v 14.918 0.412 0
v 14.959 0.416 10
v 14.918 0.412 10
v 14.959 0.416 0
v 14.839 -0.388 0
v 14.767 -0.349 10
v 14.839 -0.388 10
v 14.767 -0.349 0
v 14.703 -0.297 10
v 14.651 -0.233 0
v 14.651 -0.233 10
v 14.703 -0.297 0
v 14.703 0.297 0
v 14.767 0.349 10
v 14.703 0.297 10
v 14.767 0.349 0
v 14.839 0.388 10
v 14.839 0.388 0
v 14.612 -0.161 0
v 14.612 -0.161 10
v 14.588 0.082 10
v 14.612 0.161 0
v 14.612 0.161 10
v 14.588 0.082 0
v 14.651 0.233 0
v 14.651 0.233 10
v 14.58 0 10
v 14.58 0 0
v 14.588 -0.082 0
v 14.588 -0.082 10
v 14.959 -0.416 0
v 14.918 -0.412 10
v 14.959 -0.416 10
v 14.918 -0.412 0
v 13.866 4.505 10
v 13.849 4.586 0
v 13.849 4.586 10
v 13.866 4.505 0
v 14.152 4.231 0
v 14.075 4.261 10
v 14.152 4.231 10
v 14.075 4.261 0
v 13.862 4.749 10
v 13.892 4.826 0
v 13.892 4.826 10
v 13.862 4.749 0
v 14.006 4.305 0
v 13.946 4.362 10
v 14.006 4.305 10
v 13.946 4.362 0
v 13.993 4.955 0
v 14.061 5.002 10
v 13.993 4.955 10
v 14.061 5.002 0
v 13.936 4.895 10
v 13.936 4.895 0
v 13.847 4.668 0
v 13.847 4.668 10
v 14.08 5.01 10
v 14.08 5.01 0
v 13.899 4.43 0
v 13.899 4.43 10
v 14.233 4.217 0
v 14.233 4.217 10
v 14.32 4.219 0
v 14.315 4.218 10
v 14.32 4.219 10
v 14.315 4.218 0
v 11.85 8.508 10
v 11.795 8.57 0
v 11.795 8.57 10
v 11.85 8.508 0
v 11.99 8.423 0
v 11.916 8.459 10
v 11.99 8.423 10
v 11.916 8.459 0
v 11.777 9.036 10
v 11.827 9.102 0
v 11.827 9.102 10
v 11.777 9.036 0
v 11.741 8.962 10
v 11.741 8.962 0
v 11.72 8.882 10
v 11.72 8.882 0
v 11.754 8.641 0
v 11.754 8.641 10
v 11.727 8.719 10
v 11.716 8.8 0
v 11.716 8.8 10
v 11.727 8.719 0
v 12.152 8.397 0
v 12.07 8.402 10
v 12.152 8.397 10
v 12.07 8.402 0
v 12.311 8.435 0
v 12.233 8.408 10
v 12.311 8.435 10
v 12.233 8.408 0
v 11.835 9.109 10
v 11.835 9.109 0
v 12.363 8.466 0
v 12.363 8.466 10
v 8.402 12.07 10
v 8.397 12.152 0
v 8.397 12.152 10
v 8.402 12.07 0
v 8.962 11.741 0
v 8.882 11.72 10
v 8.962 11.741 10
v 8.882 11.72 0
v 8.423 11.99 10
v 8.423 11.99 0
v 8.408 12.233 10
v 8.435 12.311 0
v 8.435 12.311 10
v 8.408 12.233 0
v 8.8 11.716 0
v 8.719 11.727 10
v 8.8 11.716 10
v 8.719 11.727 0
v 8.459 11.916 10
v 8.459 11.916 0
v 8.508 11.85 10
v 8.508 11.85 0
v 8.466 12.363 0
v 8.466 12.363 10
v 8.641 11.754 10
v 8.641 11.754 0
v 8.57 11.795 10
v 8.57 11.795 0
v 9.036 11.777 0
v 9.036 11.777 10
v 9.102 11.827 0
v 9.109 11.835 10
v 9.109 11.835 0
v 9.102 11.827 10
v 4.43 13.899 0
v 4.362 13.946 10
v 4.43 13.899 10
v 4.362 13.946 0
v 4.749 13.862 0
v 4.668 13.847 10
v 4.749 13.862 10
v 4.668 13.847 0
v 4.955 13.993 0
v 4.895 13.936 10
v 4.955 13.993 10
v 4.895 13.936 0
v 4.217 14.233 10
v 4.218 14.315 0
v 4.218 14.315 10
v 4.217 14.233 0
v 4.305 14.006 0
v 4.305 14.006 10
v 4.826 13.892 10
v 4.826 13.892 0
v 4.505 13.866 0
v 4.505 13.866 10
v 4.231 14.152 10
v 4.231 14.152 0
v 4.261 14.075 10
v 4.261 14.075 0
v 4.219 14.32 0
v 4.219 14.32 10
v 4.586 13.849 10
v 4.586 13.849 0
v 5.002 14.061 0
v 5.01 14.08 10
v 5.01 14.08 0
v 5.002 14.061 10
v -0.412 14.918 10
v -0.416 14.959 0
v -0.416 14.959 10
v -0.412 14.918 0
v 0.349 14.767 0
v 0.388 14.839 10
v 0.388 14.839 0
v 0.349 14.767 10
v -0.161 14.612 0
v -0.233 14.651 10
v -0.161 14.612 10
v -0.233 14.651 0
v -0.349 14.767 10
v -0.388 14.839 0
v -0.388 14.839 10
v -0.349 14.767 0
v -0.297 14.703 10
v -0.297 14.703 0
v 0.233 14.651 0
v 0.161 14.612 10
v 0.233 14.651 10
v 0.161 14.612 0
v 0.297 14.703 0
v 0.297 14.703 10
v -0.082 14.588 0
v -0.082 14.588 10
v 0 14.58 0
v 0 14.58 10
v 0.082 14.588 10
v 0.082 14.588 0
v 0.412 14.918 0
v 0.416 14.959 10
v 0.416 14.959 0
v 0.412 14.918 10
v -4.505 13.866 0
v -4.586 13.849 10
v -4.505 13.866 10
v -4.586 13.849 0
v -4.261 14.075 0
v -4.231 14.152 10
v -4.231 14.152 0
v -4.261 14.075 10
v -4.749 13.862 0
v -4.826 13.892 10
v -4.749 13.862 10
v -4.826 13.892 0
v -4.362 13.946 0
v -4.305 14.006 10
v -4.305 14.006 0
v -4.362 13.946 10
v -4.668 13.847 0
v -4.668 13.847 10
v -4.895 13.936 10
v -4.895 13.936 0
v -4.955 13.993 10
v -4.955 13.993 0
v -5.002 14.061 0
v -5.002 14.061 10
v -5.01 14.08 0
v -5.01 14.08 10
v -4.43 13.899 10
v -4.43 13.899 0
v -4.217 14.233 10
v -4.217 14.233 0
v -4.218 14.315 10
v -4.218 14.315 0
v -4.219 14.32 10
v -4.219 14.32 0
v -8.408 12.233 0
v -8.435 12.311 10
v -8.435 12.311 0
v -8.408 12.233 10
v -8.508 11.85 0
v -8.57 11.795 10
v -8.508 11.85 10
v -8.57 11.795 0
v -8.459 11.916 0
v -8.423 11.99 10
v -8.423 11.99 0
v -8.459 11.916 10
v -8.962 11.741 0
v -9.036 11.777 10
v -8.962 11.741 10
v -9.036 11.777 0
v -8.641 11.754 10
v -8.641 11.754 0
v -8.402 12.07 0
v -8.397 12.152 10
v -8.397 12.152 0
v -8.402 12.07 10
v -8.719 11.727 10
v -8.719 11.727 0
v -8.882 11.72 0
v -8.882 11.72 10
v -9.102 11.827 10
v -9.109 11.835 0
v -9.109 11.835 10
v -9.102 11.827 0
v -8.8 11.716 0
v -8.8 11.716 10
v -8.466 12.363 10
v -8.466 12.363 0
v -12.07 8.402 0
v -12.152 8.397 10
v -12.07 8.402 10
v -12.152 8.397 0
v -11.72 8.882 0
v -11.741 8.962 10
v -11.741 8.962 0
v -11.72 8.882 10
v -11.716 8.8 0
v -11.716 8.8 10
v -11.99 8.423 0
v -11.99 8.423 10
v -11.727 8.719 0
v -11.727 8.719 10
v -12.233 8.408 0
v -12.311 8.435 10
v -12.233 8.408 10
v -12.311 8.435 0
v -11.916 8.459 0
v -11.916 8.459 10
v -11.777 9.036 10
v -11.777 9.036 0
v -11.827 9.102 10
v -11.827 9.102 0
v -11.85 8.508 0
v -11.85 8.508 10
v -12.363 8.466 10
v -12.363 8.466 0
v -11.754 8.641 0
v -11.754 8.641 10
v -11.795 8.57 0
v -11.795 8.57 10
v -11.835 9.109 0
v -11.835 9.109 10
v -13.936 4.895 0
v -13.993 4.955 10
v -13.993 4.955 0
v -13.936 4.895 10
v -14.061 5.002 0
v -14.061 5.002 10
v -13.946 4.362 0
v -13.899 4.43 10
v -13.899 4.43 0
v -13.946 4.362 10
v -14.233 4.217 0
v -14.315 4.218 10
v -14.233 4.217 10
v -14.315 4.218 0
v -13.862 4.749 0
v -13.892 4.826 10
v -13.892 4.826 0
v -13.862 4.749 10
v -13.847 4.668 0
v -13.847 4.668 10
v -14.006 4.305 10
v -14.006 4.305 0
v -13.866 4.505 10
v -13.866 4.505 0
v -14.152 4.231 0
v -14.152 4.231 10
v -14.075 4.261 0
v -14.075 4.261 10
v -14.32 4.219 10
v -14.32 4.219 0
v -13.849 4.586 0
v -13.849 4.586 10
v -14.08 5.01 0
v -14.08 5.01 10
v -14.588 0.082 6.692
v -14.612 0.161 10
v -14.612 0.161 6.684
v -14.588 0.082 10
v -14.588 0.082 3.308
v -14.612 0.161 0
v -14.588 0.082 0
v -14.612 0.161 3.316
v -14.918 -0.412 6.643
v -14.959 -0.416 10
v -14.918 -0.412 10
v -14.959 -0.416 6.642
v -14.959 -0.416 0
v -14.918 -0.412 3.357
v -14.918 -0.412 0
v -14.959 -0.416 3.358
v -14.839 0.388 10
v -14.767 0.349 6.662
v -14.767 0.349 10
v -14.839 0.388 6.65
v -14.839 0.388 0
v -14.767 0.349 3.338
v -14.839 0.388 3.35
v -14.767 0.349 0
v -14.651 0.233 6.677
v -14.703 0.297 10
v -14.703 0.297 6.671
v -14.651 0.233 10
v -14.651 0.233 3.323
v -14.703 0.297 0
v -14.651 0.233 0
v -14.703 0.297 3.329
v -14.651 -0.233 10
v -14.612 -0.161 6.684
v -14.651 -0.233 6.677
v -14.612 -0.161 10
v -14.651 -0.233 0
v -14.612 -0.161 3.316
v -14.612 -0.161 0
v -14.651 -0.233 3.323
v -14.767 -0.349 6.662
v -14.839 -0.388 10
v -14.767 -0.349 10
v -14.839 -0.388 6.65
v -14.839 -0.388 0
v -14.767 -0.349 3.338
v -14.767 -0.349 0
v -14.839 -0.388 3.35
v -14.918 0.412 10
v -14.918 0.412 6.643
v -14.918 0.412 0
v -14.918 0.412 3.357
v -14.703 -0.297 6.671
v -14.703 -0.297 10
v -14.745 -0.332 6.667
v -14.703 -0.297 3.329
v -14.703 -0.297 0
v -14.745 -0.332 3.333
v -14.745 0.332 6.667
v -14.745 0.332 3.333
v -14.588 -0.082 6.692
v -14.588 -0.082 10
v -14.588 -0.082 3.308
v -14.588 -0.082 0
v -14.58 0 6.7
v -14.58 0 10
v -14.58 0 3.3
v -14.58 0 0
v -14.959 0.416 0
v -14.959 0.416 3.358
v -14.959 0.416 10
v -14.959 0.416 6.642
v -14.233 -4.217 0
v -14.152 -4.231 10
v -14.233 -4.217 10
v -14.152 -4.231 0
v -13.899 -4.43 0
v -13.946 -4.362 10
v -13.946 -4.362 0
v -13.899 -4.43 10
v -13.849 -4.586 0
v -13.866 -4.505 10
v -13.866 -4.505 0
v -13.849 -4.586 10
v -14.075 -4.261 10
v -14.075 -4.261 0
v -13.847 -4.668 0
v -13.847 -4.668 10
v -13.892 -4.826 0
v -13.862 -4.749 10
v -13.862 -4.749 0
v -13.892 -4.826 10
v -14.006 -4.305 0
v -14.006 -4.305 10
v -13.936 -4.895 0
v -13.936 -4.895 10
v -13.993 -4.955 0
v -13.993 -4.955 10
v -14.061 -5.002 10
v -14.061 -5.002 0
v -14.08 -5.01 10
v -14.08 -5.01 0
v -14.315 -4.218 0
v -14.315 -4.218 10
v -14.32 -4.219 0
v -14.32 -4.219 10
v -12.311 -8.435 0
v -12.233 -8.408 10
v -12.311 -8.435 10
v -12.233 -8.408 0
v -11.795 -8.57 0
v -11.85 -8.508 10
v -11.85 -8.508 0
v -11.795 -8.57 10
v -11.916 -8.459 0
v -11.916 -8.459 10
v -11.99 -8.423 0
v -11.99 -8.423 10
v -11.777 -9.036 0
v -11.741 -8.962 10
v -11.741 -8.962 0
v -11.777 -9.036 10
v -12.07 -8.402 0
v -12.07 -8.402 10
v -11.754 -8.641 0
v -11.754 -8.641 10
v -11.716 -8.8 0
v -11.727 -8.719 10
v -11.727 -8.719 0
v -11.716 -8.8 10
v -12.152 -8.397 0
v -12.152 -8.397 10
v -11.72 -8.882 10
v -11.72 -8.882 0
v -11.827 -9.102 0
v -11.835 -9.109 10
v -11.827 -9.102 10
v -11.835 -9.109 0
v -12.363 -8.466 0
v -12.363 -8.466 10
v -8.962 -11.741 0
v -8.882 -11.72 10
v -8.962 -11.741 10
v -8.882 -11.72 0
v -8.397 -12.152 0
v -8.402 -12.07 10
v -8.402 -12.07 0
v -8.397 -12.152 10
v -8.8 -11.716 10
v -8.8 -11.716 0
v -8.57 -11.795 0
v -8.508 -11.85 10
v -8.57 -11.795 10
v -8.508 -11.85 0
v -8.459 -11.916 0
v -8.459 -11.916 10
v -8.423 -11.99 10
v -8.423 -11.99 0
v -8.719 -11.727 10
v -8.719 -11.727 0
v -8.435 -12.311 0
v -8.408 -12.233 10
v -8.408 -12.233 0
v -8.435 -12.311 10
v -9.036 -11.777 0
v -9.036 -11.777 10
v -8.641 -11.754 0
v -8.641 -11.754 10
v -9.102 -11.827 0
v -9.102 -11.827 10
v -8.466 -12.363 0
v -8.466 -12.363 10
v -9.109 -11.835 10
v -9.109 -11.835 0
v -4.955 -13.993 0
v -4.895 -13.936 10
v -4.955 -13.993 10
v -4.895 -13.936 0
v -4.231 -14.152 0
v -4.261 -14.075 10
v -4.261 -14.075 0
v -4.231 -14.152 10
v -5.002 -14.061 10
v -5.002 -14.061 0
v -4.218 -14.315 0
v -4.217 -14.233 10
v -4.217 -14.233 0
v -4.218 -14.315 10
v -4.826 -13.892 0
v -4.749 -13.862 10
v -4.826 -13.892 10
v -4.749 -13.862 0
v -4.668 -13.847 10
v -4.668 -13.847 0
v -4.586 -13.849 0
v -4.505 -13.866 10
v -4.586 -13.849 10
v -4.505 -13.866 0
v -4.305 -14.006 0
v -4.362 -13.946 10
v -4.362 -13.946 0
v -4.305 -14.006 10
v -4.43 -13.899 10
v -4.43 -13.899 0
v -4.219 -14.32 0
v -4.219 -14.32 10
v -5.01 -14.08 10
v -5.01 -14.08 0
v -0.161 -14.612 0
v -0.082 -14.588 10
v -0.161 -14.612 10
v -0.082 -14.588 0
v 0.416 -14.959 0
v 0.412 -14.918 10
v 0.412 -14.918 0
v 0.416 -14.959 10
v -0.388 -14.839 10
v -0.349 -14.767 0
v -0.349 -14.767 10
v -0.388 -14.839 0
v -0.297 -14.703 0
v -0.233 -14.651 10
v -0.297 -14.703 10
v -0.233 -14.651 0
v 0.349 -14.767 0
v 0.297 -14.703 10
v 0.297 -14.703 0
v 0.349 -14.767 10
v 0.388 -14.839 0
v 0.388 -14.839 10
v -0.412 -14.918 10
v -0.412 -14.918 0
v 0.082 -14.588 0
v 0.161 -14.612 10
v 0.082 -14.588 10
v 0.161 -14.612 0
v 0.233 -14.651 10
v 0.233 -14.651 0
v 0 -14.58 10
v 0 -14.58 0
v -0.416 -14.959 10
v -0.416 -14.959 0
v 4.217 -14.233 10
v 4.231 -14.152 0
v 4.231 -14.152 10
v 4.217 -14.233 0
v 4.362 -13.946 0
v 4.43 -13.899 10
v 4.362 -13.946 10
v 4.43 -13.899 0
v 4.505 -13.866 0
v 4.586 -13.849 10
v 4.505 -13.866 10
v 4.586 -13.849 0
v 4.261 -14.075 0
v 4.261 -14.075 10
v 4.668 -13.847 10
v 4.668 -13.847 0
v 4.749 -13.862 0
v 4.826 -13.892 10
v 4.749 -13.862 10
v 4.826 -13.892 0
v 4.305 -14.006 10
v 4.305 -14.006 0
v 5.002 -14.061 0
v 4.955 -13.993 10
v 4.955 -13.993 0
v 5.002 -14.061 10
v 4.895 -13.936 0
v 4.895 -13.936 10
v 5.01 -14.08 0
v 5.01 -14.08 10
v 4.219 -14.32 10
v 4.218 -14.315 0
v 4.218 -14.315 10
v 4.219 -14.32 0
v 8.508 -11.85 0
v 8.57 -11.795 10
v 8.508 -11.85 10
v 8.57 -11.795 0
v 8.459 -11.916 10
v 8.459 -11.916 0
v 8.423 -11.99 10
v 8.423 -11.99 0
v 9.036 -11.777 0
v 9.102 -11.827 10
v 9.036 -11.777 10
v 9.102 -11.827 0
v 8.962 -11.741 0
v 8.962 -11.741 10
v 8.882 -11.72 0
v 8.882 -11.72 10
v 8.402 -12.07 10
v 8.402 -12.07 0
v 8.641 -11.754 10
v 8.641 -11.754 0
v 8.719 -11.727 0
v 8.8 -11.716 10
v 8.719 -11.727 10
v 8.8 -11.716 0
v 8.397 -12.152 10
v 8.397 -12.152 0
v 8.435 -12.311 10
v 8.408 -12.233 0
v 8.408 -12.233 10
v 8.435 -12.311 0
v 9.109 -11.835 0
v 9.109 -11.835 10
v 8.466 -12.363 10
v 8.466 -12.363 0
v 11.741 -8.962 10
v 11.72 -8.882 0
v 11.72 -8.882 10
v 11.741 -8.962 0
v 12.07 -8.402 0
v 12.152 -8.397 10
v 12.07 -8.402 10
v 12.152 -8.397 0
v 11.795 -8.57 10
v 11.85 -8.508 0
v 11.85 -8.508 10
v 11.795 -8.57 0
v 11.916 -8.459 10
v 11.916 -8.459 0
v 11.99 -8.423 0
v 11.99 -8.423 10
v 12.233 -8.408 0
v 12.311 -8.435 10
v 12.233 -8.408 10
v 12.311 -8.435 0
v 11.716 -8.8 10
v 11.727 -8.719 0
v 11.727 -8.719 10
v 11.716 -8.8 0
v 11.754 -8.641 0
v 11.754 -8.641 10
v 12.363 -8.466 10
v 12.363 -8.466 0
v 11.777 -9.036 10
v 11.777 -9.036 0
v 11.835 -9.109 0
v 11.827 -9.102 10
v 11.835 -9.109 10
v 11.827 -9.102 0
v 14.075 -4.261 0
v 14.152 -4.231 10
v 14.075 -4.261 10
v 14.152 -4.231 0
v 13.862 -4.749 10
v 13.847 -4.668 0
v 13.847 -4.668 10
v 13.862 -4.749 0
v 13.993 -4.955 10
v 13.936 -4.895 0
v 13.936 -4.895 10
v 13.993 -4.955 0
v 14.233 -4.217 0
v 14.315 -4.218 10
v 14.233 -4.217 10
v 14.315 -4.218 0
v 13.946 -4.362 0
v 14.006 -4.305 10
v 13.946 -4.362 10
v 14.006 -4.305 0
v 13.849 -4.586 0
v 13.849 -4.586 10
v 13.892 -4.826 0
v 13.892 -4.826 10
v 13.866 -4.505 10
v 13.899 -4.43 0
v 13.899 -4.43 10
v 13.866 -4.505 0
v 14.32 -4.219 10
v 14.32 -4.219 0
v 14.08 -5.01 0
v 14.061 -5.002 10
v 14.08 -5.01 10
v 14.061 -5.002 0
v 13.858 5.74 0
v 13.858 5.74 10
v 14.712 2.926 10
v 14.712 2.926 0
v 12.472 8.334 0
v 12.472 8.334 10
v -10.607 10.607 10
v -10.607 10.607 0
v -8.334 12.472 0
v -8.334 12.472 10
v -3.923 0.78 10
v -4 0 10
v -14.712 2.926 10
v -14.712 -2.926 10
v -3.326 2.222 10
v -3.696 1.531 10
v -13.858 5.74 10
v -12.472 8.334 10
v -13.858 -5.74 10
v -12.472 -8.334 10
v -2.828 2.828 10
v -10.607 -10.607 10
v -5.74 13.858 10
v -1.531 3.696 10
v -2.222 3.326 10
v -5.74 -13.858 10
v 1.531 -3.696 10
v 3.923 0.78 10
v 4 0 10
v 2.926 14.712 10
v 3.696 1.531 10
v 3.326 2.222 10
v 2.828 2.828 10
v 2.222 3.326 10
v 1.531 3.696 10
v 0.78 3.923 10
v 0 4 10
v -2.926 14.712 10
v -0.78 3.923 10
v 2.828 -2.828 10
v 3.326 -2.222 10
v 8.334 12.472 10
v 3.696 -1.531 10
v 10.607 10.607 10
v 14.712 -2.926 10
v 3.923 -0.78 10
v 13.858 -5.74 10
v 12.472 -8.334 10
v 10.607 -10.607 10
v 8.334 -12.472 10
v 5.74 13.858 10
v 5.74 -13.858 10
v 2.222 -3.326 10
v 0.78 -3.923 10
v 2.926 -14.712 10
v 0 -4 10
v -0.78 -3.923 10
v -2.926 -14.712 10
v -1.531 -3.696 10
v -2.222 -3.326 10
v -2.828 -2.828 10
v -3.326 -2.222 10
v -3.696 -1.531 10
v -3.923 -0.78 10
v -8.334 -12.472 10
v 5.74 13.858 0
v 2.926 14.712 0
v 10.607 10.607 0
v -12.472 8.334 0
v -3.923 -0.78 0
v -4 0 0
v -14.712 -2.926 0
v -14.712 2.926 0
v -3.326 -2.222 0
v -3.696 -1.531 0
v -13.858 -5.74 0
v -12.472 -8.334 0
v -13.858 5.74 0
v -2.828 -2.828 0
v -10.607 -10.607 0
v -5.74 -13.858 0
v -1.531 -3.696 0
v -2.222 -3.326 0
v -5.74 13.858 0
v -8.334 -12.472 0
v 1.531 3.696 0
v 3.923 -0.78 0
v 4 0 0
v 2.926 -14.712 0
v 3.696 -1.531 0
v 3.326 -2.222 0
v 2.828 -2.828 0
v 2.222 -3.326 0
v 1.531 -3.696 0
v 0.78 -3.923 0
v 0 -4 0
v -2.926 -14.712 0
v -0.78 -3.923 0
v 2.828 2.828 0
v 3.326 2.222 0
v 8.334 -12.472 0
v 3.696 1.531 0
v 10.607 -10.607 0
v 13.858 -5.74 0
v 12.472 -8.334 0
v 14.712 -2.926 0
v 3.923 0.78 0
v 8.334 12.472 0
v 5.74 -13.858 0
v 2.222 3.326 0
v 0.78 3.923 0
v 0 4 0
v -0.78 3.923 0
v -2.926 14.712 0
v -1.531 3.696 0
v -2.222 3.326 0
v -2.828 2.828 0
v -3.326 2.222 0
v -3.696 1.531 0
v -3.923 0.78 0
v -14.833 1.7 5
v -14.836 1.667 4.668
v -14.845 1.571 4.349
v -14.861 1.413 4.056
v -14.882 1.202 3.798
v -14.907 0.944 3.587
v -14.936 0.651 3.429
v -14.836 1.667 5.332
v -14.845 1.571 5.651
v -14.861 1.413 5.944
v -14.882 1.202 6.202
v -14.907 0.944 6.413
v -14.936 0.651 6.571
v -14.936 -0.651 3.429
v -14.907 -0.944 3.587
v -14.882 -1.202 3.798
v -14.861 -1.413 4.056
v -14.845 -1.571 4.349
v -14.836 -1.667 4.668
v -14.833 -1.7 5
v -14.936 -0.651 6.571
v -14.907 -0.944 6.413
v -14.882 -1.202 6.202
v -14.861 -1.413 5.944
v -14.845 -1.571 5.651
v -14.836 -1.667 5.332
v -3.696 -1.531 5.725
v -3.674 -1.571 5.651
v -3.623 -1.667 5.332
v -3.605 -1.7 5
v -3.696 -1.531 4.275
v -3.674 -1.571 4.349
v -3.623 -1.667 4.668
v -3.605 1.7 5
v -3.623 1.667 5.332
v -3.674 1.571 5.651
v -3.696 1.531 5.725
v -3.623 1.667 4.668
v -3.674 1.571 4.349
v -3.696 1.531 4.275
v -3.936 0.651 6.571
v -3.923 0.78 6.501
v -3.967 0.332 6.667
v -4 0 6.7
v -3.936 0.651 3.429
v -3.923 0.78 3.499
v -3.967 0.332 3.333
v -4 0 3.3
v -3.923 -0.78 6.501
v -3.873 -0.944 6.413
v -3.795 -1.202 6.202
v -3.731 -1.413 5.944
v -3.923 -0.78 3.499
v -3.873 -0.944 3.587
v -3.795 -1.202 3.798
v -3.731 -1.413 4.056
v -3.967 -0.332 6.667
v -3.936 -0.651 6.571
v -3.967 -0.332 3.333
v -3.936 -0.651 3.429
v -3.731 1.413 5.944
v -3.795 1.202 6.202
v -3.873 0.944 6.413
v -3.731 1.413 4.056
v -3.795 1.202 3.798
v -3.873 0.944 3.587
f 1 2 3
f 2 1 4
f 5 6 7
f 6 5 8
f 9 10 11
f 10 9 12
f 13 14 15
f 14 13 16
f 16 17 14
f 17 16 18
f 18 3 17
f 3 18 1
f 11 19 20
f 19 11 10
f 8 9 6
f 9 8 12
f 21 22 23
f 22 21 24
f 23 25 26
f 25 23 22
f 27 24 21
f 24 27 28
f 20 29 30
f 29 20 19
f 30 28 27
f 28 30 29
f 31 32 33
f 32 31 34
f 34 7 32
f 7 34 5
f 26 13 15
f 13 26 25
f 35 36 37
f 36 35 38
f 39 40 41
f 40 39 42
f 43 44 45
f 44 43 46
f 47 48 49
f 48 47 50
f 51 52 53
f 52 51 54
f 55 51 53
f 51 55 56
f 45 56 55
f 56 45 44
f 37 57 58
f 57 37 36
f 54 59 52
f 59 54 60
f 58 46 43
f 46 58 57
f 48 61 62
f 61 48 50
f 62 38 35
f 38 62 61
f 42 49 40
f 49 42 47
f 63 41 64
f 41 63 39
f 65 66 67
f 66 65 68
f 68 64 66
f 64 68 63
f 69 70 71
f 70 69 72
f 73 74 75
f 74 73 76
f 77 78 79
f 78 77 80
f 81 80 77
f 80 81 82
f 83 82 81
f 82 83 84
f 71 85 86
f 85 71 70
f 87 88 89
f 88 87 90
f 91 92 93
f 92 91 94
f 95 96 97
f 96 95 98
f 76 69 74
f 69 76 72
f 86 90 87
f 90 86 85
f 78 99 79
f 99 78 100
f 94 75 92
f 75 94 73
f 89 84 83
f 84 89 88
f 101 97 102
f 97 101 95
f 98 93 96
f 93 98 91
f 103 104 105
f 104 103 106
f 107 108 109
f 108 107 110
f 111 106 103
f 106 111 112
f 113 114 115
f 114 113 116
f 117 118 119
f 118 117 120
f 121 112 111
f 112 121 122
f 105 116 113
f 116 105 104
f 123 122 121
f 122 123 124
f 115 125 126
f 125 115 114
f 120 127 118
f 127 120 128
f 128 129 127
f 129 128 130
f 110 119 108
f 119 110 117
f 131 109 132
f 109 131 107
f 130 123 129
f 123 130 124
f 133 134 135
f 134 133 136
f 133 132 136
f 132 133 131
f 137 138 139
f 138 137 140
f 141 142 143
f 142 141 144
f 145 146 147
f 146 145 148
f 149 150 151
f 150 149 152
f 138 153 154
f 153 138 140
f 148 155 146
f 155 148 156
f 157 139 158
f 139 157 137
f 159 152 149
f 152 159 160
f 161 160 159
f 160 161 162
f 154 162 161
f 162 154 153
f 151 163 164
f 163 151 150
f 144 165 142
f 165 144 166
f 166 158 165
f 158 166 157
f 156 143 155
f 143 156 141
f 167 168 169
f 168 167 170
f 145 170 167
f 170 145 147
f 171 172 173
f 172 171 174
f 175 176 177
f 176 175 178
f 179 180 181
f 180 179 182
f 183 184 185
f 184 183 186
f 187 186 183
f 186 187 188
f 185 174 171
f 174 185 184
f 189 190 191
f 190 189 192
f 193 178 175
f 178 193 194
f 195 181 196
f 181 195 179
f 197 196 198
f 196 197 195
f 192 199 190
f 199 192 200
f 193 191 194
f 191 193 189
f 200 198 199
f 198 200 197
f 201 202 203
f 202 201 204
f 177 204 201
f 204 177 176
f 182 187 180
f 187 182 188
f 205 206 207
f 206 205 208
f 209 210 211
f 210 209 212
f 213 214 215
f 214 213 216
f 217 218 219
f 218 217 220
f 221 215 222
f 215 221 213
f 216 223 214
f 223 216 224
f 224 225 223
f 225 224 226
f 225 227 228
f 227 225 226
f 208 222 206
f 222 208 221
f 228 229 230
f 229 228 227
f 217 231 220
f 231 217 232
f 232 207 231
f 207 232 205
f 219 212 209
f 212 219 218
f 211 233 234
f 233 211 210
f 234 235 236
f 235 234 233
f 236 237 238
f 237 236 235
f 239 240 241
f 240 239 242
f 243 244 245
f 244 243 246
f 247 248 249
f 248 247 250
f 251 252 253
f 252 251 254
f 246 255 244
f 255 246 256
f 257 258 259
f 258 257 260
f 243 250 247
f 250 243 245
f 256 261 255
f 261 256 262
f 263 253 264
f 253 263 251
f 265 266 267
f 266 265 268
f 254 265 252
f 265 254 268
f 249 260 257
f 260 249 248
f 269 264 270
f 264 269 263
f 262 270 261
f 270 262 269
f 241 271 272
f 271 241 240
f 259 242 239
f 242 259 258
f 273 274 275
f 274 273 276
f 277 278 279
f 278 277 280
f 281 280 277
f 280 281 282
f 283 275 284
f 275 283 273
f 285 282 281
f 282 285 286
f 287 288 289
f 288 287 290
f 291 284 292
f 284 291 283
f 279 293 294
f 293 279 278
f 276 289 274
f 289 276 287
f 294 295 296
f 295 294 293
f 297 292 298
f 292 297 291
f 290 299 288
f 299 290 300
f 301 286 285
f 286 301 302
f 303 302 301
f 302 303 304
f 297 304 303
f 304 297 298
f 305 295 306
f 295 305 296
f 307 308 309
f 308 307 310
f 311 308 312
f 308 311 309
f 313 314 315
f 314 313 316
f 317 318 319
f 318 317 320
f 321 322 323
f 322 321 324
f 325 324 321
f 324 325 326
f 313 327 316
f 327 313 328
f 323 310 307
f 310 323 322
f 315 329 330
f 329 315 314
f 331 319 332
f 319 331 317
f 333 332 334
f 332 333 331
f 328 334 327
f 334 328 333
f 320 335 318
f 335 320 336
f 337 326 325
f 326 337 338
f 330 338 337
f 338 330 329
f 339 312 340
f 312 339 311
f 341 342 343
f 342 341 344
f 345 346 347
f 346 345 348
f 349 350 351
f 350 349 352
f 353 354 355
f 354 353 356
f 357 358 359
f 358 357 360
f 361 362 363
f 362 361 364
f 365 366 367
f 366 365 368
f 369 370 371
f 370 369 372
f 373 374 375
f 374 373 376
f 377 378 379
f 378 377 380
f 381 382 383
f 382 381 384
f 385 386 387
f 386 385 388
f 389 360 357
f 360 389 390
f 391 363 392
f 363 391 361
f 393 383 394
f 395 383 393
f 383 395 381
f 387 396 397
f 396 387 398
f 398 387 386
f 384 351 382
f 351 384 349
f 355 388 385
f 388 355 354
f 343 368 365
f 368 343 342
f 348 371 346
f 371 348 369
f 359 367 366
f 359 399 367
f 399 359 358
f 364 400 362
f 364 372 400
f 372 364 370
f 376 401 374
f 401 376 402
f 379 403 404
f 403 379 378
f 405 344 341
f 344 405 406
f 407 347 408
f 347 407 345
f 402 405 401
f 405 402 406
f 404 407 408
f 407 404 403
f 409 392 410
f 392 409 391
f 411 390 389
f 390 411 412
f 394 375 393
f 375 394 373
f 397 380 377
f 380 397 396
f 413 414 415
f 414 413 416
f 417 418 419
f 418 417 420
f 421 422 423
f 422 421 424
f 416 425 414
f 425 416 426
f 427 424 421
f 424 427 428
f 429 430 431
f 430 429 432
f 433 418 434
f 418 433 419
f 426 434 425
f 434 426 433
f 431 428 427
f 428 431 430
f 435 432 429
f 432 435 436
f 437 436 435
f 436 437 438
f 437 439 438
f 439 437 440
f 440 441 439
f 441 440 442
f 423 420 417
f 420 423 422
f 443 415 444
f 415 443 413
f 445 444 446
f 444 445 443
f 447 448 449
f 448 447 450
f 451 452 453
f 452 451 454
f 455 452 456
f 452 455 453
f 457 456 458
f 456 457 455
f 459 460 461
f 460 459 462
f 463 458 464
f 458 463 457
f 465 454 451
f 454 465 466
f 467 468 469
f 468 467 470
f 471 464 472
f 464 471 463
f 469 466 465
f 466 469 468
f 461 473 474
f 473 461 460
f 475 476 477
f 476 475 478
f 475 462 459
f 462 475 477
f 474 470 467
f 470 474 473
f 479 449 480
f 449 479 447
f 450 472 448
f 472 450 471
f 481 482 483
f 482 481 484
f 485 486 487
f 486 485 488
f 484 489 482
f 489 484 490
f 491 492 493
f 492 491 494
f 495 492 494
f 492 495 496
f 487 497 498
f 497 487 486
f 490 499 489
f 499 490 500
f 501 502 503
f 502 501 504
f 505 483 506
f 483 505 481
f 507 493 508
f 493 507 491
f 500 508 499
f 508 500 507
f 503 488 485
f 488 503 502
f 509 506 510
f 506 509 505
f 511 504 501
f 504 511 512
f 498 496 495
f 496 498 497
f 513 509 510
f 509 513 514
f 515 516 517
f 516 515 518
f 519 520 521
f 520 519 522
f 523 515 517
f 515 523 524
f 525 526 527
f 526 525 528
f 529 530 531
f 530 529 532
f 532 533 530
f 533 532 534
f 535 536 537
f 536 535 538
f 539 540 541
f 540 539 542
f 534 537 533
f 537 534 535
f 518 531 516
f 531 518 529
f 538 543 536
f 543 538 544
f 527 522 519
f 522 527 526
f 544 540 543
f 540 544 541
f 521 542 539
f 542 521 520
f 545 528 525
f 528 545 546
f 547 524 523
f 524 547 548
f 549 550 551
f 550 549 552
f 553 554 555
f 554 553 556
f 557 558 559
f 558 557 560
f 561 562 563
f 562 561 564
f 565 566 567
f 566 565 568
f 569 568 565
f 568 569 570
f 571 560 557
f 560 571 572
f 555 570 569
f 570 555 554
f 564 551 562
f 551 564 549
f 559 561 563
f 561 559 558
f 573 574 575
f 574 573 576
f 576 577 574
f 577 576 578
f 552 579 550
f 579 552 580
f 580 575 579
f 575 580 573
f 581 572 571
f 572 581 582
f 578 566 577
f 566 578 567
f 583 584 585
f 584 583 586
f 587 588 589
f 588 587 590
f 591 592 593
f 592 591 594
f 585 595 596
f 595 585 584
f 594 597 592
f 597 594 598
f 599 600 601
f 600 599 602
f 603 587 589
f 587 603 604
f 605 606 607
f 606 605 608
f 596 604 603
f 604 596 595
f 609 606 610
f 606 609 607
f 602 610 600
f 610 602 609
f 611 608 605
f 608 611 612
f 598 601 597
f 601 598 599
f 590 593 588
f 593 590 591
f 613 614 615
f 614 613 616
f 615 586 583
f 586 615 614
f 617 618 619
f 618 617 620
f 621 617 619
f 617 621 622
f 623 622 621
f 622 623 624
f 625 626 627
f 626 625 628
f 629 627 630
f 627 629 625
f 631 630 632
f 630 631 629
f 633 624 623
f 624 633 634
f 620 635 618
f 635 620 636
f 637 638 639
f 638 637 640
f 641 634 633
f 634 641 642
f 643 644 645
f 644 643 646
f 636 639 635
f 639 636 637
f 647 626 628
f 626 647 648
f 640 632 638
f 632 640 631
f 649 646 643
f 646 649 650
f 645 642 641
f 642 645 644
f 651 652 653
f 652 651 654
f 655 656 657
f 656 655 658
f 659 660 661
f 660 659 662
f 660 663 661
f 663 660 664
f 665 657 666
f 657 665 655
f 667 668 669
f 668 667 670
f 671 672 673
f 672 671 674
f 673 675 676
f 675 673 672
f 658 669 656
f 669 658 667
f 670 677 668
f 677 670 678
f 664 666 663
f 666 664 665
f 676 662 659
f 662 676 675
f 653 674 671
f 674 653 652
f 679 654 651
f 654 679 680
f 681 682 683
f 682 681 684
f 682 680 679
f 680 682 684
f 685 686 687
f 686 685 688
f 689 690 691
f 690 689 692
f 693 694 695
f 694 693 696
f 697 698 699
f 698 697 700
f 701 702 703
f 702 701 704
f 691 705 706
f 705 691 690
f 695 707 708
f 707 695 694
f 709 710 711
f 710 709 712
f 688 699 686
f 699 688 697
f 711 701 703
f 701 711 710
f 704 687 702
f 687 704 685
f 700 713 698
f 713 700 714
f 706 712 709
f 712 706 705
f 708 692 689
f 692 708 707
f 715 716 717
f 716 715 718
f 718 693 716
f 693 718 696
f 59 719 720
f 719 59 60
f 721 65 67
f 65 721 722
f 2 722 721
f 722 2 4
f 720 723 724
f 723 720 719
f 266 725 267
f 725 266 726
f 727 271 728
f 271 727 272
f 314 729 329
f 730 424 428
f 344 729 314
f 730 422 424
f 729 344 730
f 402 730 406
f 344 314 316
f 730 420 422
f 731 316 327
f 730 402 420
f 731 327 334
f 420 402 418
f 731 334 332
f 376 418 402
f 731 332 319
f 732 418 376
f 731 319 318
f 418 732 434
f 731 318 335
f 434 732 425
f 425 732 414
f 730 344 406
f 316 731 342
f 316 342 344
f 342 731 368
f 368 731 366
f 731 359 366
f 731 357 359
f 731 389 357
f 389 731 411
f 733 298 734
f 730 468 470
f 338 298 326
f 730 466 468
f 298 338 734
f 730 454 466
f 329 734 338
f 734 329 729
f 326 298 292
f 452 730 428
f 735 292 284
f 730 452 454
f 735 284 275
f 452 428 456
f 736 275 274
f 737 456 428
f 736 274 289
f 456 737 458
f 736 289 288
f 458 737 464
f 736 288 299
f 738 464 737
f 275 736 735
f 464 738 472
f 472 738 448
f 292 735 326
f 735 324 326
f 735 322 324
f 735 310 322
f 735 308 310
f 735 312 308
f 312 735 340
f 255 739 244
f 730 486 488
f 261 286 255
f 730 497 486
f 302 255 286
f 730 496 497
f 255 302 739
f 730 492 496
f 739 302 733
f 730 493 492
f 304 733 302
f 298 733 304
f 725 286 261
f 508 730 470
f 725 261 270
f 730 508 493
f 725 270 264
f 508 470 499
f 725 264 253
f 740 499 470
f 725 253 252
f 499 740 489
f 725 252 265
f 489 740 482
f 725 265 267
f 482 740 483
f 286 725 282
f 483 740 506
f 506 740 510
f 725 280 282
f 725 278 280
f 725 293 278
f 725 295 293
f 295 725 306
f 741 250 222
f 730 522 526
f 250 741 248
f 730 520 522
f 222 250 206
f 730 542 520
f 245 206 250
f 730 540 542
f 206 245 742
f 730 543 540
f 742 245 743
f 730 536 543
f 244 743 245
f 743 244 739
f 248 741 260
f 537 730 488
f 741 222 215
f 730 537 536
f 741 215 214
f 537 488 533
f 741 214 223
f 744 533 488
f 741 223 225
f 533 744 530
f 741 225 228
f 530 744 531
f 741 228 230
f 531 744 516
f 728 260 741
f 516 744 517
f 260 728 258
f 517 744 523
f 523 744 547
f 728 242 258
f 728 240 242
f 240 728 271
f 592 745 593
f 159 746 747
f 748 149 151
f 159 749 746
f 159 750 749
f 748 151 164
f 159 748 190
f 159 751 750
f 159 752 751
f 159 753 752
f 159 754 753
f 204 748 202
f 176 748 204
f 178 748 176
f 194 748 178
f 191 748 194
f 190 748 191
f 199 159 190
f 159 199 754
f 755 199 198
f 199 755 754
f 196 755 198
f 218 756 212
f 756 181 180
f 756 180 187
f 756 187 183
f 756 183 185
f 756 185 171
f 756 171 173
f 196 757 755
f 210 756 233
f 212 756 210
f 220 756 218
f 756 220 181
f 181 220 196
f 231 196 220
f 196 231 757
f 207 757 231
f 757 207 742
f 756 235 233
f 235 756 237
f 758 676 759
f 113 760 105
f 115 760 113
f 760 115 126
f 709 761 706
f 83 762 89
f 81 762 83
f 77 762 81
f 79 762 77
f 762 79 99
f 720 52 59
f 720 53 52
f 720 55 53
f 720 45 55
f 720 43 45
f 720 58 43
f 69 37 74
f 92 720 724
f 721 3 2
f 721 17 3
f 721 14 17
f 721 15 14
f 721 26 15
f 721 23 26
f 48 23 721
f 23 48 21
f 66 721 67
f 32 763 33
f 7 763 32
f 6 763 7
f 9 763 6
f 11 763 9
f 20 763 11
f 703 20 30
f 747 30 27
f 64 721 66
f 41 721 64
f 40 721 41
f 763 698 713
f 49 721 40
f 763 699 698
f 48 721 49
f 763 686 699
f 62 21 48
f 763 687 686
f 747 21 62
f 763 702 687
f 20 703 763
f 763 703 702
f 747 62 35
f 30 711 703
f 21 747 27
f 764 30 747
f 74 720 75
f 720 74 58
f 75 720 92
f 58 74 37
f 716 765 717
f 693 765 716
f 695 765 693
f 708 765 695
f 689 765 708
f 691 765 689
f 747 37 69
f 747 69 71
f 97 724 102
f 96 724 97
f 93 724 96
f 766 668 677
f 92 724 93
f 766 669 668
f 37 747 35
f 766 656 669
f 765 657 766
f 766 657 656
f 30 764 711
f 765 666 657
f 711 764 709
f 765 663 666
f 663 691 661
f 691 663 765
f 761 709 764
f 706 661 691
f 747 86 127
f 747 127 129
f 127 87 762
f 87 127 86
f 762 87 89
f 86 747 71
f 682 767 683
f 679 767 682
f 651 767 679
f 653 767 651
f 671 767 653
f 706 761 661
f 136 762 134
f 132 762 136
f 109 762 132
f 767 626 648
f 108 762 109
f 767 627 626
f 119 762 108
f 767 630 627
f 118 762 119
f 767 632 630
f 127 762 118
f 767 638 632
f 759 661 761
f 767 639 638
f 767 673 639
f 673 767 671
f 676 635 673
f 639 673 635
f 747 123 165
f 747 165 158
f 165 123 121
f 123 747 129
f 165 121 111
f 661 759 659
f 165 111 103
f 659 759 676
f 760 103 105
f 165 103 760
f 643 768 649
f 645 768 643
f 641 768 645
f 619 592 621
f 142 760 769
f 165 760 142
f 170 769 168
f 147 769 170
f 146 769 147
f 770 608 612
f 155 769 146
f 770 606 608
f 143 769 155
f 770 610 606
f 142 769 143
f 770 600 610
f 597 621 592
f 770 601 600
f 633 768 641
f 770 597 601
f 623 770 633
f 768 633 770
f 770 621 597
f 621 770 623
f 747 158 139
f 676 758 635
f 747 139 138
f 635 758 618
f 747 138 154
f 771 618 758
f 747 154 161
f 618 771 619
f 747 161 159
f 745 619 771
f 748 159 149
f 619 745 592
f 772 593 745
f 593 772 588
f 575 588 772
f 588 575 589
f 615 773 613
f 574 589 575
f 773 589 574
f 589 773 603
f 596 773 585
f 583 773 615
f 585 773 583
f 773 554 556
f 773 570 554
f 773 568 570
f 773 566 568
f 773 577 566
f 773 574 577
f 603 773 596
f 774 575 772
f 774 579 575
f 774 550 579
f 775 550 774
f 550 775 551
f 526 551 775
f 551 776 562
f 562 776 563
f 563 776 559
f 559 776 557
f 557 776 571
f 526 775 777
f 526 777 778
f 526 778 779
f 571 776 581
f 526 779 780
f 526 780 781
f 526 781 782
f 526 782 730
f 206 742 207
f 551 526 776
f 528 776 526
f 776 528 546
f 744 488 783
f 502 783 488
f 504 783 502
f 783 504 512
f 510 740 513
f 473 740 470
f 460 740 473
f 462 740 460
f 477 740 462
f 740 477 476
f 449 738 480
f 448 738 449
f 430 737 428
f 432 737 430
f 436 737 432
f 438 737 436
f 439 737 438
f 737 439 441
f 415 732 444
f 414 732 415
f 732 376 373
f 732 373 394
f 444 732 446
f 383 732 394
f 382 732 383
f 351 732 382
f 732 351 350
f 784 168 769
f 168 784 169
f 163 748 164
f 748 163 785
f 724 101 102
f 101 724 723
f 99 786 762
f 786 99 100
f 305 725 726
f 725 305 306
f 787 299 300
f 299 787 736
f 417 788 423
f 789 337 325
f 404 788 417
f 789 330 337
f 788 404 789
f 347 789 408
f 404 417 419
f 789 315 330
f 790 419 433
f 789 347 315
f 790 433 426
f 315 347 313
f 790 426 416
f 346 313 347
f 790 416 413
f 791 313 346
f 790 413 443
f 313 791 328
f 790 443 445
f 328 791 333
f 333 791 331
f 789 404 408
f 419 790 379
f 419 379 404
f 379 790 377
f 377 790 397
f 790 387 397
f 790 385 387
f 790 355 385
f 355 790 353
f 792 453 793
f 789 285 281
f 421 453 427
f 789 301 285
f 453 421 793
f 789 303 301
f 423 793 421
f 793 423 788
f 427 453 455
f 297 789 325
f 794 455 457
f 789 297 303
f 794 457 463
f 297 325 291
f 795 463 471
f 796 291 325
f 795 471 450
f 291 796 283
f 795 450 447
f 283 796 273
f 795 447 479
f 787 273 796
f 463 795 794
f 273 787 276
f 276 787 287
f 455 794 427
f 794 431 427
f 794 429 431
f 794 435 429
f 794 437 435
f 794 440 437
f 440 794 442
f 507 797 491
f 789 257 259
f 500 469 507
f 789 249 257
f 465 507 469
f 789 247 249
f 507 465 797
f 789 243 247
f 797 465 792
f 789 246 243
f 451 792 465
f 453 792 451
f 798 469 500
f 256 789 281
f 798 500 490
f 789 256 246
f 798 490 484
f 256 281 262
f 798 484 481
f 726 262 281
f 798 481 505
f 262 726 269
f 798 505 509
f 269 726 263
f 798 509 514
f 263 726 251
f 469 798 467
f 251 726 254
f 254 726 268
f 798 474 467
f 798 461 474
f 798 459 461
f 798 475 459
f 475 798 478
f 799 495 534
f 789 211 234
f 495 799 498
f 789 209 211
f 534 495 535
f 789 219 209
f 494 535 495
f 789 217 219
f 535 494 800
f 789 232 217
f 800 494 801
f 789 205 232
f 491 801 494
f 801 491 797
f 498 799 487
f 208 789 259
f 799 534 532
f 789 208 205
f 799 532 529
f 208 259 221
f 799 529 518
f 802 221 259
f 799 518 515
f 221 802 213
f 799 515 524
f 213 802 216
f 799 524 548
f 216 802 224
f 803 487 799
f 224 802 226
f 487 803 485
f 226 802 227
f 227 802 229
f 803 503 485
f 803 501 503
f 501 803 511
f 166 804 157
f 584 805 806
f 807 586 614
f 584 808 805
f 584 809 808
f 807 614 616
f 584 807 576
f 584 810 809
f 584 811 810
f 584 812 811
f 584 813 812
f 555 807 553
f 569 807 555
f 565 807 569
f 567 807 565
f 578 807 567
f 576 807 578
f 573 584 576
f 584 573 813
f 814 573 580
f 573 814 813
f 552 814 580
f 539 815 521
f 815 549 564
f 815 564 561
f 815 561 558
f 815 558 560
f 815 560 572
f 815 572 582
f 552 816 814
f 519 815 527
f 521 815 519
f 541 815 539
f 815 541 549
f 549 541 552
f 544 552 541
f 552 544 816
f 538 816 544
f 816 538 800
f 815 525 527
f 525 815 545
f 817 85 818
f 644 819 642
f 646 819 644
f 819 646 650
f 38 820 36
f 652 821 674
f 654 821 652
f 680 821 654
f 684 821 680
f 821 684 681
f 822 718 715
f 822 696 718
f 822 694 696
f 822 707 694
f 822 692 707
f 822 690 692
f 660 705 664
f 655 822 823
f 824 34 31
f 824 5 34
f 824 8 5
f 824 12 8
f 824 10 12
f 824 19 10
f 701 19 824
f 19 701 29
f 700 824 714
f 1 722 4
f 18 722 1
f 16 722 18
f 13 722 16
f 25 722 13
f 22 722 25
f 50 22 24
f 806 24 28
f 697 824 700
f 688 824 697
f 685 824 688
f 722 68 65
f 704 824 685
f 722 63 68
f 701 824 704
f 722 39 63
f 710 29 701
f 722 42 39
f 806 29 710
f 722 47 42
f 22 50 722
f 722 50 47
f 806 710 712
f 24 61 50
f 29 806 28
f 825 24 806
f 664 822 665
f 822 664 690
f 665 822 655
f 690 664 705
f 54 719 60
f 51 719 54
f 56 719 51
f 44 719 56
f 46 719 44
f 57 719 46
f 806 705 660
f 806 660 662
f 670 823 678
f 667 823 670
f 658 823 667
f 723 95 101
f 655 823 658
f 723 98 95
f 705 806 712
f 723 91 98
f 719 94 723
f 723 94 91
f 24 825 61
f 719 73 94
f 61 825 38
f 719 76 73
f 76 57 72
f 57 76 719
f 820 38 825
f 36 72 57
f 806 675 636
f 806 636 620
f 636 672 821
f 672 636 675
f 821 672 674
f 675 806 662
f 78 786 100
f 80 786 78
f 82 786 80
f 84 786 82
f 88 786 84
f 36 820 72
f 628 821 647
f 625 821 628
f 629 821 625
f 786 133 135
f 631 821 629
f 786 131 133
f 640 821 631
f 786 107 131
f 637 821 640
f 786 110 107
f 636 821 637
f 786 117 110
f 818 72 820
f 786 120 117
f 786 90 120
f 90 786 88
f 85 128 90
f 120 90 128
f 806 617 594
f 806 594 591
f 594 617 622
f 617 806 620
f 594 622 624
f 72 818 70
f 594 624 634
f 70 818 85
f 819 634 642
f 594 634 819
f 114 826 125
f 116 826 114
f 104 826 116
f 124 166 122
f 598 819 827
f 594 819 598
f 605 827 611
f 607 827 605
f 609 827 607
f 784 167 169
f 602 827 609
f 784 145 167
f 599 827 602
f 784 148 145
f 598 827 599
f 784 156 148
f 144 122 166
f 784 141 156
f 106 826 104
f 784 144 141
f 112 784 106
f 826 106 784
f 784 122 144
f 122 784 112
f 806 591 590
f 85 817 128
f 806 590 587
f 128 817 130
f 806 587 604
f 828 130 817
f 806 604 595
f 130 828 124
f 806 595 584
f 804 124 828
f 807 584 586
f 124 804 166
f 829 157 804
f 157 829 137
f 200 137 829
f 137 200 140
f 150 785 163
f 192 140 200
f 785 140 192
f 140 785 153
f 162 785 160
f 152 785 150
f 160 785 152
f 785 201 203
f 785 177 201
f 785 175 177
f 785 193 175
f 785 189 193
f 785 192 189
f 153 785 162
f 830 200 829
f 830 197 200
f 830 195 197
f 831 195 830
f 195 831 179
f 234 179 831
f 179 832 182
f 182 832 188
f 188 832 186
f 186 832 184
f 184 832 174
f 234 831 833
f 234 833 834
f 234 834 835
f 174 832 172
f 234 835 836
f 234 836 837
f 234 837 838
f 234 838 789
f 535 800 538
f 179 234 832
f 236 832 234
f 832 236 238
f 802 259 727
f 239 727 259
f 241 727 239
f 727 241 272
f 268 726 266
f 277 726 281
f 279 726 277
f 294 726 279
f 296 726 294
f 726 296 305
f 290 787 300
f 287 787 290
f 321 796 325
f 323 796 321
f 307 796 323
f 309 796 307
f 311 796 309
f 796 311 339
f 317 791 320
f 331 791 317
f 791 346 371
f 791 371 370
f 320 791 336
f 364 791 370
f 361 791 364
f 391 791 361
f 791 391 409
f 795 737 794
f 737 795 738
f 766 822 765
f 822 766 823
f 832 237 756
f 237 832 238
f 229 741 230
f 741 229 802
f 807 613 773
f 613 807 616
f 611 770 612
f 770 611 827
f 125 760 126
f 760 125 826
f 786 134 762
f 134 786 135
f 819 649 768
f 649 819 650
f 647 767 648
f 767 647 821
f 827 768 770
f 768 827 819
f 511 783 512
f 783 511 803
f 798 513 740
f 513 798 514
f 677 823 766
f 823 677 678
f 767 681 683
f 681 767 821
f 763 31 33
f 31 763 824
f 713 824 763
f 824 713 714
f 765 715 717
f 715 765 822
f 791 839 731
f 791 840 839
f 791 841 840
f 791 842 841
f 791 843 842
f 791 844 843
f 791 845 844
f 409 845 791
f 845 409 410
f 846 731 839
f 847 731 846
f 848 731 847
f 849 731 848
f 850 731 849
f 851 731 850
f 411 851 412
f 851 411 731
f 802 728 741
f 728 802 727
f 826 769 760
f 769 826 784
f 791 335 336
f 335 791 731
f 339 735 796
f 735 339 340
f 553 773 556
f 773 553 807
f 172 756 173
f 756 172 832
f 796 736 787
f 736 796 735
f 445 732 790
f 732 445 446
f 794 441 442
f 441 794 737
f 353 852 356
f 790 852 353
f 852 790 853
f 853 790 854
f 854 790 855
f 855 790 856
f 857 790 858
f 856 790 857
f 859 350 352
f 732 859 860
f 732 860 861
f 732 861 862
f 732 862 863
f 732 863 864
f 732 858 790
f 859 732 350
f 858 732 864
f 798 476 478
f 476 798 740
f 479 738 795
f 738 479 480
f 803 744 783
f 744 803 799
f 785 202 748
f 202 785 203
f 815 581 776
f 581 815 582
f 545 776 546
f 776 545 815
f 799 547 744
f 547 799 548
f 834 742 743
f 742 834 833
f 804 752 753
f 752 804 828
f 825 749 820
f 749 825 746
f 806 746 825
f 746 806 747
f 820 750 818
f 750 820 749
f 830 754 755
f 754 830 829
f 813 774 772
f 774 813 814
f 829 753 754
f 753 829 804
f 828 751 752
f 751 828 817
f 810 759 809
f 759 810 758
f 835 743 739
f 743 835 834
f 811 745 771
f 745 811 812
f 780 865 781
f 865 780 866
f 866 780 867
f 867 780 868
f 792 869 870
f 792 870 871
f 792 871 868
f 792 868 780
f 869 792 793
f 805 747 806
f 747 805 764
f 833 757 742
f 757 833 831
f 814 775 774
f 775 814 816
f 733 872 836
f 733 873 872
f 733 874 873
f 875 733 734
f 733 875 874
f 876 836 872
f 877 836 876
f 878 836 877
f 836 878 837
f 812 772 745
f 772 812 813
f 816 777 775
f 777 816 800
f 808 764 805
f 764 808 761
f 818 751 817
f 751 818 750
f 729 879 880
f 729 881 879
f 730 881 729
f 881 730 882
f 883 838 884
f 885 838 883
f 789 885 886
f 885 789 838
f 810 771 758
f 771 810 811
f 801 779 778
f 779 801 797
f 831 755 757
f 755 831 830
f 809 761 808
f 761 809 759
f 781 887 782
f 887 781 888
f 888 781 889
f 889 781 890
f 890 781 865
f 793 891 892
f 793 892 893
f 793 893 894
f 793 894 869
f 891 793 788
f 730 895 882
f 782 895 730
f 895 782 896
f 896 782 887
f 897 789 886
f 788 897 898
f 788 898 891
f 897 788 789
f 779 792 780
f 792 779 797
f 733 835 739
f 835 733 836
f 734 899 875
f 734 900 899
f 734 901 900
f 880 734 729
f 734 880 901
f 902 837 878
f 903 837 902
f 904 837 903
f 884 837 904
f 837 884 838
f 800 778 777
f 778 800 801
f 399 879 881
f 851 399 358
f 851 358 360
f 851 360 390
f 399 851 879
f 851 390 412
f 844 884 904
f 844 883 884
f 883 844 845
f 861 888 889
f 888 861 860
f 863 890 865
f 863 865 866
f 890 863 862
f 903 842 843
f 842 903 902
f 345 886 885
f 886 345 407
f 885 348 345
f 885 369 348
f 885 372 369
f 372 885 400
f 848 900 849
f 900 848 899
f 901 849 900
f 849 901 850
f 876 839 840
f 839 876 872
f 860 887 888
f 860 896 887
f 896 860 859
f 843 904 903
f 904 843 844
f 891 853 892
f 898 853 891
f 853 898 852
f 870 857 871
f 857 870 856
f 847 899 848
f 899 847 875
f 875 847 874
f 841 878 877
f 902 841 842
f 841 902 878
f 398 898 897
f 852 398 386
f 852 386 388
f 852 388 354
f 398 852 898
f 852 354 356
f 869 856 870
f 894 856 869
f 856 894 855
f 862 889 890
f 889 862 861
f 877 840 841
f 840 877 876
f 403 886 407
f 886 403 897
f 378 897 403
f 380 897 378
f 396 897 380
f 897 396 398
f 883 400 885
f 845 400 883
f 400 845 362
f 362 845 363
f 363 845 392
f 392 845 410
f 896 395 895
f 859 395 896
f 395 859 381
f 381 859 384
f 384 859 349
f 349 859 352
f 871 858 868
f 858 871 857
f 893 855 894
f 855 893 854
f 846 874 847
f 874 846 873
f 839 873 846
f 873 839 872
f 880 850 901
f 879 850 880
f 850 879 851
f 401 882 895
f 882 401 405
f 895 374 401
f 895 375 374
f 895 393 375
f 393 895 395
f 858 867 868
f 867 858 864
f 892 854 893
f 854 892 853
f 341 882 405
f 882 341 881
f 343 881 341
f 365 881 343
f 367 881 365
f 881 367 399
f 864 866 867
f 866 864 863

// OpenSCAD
$fn = 32;

// ----------------------------------------------------------------------
// Hand knob: 30 x 30 x 10 mm
// ----------------------------------------------------------------------

// --- parameters (mm) ---
grip_d = 30;              // knob diameter
grip_h = 10;              // knob height
shaft_d = 8;              // shaft bore
set_d = 3.4;              // set screw tap hole
knurl_dia = 0.84;         // knurl groove diameter
knurl_n = 20;             // number of knurl grooves

module body() {
  cylinder(h = grip_h, d = grip_d);
}

difference() {
  union() {
    body();
  }
  translate([0, 0, -1]) cylinder(h = grip_h + 0 + 2, d = shaft_d);
  /* knurl grooves */
  for (i = [0 : knurl_n - 1])
    rotate([0, 0, i * 360 / knurl_n])
      translate([grip_d / 2, 0, -0.5])
        cylinder(h = grip_h + 1, d = knurl_dia);
  translate([-grip_d / 2 - 1, 0, grip_h * 0.5]) rotate([0, 90, 0]) cylinder(h = grip_d / 2 + 2, d = set_d);
}
